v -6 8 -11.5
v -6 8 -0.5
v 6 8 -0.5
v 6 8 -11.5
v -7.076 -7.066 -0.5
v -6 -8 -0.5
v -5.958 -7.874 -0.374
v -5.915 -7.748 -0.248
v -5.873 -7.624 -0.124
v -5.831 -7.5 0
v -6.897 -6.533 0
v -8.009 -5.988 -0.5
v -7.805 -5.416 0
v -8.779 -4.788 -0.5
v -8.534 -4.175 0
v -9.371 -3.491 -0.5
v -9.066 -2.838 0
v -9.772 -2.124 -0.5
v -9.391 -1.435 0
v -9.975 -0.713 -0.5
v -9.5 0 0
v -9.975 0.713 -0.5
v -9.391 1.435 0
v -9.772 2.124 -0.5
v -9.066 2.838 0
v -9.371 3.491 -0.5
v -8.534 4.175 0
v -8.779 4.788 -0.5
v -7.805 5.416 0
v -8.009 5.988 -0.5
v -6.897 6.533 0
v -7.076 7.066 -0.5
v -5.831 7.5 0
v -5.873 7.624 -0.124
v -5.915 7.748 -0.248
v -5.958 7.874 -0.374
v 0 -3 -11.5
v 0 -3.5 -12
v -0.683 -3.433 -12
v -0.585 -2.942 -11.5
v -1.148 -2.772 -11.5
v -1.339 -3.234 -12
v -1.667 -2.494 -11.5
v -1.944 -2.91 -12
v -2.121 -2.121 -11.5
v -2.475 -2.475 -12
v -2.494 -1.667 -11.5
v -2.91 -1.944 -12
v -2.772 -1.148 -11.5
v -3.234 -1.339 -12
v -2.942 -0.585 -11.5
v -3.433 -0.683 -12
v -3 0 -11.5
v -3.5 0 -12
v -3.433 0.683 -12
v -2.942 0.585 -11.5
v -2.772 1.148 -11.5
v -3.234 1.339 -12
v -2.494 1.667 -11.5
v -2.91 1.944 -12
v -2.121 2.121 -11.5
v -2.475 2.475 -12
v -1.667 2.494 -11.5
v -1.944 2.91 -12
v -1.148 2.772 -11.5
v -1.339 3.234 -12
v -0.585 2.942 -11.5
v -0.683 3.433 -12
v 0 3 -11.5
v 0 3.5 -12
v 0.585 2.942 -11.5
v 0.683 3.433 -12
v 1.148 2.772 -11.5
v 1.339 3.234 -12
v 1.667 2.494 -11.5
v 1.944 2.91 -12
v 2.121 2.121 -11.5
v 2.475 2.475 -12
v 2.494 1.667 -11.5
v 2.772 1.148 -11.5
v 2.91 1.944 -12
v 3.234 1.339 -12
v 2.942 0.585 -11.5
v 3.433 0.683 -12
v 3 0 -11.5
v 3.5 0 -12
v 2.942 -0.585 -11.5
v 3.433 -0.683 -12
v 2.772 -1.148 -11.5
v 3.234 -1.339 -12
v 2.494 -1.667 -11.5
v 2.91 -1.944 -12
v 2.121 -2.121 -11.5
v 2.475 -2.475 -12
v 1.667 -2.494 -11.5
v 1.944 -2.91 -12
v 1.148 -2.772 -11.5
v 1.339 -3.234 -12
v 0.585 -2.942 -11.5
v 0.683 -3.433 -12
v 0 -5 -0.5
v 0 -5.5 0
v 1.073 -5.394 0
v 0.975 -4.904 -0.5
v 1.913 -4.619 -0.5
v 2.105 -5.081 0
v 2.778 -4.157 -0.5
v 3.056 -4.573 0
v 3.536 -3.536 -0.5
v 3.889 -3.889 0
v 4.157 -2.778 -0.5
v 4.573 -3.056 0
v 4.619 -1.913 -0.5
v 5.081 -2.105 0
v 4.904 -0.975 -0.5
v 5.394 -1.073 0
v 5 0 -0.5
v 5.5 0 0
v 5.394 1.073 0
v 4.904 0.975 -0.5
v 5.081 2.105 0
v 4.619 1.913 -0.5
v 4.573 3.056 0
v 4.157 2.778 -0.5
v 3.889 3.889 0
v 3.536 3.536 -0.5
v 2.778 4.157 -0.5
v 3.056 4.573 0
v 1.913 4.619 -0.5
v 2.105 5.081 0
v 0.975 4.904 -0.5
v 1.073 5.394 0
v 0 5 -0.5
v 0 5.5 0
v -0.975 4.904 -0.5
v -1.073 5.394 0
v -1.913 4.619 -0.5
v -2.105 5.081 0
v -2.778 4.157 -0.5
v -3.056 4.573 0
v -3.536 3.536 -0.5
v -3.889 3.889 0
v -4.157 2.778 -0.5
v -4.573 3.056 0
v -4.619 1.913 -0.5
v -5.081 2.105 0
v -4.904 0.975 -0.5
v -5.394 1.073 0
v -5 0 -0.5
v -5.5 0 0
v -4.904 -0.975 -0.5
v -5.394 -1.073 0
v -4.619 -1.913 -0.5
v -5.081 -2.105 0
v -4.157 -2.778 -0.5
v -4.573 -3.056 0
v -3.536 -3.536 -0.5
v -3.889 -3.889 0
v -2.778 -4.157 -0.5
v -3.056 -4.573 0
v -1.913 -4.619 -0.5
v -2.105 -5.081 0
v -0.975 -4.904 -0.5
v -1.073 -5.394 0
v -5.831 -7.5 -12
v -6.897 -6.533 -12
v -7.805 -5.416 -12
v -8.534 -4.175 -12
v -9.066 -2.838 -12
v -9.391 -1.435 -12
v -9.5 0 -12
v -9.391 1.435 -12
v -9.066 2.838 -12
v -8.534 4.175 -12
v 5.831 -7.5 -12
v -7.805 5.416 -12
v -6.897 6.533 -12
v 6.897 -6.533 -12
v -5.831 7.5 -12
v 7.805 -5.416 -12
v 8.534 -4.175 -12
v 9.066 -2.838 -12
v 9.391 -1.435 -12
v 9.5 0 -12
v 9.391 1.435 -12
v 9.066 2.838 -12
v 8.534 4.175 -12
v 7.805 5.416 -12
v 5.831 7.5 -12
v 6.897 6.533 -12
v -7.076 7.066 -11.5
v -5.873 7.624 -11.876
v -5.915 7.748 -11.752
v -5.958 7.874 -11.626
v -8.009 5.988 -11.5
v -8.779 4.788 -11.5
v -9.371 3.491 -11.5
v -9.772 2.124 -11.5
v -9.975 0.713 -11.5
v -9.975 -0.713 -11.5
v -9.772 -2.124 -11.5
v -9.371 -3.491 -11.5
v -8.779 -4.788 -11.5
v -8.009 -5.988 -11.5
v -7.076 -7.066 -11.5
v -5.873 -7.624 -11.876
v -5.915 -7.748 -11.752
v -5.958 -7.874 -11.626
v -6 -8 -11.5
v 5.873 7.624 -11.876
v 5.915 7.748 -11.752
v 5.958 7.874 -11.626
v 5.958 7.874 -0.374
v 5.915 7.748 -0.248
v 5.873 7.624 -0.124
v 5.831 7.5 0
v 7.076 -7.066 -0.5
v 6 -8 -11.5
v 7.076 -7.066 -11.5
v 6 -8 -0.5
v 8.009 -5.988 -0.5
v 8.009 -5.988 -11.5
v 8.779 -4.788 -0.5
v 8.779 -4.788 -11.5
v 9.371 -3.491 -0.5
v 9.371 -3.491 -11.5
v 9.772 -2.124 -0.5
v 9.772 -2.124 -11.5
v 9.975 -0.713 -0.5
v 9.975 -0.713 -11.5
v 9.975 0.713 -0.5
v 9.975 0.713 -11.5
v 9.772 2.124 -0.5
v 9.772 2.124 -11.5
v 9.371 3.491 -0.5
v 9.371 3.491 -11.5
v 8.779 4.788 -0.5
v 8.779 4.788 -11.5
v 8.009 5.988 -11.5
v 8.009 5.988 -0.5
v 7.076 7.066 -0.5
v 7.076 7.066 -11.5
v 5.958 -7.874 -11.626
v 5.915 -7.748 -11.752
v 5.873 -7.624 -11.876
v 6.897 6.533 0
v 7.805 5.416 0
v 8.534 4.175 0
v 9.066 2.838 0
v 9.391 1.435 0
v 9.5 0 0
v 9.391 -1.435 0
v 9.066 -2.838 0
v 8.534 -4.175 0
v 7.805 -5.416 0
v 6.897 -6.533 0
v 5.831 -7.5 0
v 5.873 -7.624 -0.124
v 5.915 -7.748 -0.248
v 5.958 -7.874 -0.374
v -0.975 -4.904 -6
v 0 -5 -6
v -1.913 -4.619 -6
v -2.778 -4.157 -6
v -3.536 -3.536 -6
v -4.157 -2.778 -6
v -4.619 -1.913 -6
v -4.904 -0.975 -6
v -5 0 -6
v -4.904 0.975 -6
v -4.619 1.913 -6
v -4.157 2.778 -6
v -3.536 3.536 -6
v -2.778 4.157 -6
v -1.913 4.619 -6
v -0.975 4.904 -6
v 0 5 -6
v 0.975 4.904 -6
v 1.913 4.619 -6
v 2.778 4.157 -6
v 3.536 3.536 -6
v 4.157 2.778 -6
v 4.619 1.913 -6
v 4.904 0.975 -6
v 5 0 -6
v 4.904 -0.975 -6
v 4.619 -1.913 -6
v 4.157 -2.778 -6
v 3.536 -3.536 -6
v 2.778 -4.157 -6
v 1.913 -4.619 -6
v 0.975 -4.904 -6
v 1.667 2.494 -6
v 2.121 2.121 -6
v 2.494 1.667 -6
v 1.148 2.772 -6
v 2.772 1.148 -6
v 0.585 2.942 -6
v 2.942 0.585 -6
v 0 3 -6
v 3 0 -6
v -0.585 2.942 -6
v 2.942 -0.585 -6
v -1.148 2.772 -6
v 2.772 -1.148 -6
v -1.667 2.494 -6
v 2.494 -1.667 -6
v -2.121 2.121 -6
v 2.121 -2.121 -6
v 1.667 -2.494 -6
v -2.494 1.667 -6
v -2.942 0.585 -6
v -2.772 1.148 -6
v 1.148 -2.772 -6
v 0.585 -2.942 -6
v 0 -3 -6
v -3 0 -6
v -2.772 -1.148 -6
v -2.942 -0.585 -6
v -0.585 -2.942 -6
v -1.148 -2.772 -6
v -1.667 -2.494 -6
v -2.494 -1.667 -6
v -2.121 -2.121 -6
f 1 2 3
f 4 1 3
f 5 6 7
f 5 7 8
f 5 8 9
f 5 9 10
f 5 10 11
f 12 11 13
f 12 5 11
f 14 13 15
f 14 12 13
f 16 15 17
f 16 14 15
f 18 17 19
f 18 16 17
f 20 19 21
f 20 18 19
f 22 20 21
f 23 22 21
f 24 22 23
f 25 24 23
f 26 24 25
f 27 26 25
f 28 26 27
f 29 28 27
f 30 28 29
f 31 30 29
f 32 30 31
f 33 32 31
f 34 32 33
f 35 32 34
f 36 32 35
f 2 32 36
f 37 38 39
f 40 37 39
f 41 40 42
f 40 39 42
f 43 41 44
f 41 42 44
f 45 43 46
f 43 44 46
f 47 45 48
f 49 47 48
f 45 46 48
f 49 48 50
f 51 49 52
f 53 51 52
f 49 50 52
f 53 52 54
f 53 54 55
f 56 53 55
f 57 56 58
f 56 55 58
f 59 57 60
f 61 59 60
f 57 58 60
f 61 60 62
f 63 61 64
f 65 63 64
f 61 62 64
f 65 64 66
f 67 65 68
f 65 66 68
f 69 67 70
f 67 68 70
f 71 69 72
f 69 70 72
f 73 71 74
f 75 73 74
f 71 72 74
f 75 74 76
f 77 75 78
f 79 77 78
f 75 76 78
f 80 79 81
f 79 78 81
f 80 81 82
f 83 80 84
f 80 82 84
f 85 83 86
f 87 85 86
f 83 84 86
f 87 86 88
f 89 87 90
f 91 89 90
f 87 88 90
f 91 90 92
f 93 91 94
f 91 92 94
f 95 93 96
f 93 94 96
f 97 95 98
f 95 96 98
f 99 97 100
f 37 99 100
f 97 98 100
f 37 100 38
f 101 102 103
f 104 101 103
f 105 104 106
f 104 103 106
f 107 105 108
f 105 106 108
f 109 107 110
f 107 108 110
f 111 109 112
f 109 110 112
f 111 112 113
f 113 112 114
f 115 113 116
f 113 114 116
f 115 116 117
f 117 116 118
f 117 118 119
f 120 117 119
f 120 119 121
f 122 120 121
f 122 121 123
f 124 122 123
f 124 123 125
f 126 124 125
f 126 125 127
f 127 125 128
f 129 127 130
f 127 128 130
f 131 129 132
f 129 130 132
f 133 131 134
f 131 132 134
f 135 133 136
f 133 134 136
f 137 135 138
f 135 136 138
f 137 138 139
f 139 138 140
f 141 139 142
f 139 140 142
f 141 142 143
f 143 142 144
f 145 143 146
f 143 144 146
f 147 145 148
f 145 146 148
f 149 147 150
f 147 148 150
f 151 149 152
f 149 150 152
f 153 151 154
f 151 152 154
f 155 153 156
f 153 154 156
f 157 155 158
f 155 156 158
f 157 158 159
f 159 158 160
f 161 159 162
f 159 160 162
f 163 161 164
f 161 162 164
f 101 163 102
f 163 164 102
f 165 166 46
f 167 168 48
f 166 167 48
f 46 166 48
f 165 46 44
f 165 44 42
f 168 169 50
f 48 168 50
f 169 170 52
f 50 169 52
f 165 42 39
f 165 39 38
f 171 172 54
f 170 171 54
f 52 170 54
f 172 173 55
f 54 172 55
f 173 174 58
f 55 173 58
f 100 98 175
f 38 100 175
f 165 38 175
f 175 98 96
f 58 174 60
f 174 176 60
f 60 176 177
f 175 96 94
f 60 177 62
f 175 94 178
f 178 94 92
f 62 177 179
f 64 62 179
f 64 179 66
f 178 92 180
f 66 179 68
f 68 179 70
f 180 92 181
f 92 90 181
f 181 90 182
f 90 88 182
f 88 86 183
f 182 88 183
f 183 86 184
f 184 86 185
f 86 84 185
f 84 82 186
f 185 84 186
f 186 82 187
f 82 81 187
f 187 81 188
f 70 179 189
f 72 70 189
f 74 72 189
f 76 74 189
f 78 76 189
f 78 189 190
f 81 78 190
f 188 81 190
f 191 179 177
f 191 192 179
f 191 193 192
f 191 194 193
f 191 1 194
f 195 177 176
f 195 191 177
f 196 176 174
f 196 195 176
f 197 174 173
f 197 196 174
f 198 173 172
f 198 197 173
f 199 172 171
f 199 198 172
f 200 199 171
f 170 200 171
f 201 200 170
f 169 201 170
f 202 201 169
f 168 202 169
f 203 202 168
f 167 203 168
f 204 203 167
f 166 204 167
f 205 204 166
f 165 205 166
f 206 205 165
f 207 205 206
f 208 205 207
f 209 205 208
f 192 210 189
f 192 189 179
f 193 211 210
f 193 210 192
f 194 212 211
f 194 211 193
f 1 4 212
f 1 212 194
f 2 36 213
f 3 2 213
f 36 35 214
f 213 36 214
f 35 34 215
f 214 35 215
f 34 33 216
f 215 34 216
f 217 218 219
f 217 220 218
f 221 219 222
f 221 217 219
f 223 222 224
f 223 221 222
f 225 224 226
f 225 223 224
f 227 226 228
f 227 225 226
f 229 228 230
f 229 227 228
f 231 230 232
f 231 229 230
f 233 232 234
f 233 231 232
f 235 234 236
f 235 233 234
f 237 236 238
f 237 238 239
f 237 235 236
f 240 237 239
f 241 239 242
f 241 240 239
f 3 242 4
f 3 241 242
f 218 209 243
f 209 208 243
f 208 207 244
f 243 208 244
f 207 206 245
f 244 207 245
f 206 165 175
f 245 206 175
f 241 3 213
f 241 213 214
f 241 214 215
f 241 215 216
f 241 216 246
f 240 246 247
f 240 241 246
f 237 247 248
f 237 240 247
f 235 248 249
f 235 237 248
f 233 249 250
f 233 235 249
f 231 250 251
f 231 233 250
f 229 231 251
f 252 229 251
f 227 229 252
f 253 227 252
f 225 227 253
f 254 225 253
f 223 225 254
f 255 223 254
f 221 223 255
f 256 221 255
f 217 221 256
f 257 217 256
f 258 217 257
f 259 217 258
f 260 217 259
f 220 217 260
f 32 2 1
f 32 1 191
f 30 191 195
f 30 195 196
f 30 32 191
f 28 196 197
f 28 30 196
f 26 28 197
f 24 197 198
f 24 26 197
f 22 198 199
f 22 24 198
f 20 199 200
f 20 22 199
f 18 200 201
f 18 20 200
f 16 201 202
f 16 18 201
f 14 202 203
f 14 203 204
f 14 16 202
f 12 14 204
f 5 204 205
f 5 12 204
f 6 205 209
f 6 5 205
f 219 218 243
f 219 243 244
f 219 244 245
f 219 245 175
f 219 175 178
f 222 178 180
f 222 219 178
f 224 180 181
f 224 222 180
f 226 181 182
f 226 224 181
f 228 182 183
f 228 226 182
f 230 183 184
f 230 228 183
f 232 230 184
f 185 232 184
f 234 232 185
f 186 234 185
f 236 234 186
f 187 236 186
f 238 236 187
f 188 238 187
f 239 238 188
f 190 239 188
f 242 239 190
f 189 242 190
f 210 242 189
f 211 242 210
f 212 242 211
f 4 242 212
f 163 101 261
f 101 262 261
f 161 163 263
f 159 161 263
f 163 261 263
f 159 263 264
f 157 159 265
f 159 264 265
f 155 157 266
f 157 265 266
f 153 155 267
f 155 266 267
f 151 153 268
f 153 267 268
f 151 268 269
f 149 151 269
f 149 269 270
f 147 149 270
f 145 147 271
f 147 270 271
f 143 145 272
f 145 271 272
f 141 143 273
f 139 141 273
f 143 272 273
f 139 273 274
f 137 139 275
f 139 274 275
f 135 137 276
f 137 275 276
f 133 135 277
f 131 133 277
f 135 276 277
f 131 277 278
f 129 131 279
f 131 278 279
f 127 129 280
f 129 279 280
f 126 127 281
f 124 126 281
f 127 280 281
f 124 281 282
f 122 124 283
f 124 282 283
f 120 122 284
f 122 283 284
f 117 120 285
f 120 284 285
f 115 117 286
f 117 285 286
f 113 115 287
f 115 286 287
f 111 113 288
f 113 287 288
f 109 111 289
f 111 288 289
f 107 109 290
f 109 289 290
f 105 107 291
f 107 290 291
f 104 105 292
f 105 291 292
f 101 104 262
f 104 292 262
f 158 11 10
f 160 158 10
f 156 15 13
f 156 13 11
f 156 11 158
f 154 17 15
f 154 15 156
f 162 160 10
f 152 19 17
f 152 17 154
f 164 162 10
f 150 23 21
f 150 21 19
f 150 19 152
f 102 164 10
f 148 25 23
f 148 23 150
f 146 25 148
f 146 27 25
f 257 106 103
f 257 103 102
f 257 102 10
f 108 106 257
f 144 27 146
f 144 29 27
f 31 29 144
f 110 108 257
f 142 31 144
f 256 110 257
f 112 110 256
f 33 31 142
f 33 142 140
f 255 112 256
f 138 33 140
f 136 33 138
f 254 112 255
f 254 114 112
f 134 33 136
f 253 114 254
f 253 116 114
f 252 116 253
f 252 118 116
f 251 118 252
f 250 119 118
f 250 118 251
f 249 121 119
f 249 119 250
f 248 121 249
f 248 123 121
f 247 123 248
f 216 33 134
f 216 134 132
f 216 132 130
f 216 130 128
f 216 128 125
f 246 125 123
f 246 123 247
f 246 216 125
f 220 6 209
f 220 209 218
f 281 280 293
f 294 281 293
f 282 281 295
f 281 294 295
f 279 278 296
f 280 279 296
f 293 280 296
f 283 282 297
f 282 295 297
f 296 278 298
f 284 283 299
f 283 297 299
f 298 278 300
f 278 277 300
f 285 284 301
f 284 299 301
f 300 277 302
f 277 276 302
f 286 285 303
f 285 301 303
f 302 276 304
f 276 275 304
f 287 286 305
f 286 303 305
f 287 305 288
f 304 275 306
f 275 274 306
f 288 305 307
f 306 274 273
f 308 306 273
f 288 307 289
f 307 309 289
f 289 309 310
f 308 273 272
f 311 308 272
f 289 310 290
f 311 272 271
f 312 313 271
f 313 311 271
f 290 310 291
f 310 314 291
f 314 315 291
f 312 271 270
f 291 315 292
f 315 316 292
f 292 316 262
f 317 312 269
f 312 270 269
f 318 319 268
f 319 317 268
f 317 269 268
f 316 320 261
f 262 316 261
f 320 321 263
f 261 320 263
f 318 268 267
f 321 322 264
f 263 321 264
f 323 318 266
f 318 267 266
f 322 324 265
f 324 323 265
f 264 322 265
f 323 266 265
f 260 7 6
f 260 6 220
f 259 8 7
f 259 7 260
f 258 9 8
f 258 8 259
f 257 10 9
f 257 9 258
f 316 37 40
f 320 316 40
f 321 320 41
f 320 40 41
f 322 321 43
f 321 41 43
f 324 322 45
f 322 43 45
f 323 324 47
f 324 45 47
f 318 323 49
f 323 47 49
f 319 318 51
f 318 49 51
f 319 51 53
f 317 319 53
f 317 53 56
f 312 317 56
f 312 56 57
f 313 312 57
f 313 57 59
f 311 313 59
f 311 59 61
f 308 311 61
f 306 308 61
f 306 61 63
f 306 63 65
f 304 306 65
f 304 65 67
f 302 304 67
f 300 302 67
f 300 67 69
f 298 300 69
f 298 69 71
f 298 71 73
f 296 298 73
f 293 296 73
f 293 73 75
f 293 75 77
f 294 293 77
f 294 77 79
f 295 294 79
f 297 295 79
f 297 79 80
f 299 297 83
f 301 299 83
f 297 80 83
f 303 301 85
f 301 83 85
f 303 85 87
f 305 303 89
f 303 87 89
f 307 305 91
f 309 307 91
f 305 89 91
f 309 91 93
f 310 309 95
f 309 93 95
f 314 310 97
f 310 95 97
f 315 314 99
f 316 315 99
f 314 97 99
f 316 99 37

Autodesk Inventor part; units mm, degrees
ref_plane "YZ Plane" through (0, 0, 0) normal (1, 0, 0) x (0, 1, 0)
ref_plane "XZ Plane" through (0, 0, 0) normal (0, 1, 0) x (-1, 0, 0)
ref_plane "XY Plane" through (0, 0, 0) normal (0, 0, 1) x (1, 0, 0)
sketch "Sketch1" plane through (0, 0, 0) normal (0, 0, 1) x (1, 0, 0)
  circle A0 centre (0, 0) radius 10
  line L0 (0, 10) -> (0, 8)
  line L1 (0, -10) -> (0, -8)
  line L2 (-6, -8) -> (6, -8)
  line L3 (-6, 8) -> (6, 8)
  point P0 (-6, 8)
  point P1 (-6, -8)
  dimension "d0" = 20
  dimension "d28" = 2
  dimension "d29" = 2
extrude "Extrusion1" add sketch "Sketch1" against normal blind 12 contours A0 L2 L3
hole "Hole1" at (0, 0, 0) direction (0, 0, -1) diameter 10 depth 6
hole "Hole2" at (0, 0, 0) direction (0, 0, -1) diameter 6 end through all
thread "Thread1" size "M10x1.5" class "6H" standard "ANSI Metric M Profile" full length
thread "Thread2" size "M6x1" class "6H" standard "ANSI Metric M Profile" full length
chamfer "Chamfer3" distance 0.5 angle 45 8 edges at (0, 8, 0) (0, -8, 0) (10, 0, 0) (-10, 0, 0) (0, -8, -12) (0, 8, -12) (10, 0, -12) (-10, 0, -12)
chamfer "Chamfer4" distance 0.5 angle 45 2 edges at (0, 5, 0) (0, 3, -12)
properties part number "NozzleConnector"
